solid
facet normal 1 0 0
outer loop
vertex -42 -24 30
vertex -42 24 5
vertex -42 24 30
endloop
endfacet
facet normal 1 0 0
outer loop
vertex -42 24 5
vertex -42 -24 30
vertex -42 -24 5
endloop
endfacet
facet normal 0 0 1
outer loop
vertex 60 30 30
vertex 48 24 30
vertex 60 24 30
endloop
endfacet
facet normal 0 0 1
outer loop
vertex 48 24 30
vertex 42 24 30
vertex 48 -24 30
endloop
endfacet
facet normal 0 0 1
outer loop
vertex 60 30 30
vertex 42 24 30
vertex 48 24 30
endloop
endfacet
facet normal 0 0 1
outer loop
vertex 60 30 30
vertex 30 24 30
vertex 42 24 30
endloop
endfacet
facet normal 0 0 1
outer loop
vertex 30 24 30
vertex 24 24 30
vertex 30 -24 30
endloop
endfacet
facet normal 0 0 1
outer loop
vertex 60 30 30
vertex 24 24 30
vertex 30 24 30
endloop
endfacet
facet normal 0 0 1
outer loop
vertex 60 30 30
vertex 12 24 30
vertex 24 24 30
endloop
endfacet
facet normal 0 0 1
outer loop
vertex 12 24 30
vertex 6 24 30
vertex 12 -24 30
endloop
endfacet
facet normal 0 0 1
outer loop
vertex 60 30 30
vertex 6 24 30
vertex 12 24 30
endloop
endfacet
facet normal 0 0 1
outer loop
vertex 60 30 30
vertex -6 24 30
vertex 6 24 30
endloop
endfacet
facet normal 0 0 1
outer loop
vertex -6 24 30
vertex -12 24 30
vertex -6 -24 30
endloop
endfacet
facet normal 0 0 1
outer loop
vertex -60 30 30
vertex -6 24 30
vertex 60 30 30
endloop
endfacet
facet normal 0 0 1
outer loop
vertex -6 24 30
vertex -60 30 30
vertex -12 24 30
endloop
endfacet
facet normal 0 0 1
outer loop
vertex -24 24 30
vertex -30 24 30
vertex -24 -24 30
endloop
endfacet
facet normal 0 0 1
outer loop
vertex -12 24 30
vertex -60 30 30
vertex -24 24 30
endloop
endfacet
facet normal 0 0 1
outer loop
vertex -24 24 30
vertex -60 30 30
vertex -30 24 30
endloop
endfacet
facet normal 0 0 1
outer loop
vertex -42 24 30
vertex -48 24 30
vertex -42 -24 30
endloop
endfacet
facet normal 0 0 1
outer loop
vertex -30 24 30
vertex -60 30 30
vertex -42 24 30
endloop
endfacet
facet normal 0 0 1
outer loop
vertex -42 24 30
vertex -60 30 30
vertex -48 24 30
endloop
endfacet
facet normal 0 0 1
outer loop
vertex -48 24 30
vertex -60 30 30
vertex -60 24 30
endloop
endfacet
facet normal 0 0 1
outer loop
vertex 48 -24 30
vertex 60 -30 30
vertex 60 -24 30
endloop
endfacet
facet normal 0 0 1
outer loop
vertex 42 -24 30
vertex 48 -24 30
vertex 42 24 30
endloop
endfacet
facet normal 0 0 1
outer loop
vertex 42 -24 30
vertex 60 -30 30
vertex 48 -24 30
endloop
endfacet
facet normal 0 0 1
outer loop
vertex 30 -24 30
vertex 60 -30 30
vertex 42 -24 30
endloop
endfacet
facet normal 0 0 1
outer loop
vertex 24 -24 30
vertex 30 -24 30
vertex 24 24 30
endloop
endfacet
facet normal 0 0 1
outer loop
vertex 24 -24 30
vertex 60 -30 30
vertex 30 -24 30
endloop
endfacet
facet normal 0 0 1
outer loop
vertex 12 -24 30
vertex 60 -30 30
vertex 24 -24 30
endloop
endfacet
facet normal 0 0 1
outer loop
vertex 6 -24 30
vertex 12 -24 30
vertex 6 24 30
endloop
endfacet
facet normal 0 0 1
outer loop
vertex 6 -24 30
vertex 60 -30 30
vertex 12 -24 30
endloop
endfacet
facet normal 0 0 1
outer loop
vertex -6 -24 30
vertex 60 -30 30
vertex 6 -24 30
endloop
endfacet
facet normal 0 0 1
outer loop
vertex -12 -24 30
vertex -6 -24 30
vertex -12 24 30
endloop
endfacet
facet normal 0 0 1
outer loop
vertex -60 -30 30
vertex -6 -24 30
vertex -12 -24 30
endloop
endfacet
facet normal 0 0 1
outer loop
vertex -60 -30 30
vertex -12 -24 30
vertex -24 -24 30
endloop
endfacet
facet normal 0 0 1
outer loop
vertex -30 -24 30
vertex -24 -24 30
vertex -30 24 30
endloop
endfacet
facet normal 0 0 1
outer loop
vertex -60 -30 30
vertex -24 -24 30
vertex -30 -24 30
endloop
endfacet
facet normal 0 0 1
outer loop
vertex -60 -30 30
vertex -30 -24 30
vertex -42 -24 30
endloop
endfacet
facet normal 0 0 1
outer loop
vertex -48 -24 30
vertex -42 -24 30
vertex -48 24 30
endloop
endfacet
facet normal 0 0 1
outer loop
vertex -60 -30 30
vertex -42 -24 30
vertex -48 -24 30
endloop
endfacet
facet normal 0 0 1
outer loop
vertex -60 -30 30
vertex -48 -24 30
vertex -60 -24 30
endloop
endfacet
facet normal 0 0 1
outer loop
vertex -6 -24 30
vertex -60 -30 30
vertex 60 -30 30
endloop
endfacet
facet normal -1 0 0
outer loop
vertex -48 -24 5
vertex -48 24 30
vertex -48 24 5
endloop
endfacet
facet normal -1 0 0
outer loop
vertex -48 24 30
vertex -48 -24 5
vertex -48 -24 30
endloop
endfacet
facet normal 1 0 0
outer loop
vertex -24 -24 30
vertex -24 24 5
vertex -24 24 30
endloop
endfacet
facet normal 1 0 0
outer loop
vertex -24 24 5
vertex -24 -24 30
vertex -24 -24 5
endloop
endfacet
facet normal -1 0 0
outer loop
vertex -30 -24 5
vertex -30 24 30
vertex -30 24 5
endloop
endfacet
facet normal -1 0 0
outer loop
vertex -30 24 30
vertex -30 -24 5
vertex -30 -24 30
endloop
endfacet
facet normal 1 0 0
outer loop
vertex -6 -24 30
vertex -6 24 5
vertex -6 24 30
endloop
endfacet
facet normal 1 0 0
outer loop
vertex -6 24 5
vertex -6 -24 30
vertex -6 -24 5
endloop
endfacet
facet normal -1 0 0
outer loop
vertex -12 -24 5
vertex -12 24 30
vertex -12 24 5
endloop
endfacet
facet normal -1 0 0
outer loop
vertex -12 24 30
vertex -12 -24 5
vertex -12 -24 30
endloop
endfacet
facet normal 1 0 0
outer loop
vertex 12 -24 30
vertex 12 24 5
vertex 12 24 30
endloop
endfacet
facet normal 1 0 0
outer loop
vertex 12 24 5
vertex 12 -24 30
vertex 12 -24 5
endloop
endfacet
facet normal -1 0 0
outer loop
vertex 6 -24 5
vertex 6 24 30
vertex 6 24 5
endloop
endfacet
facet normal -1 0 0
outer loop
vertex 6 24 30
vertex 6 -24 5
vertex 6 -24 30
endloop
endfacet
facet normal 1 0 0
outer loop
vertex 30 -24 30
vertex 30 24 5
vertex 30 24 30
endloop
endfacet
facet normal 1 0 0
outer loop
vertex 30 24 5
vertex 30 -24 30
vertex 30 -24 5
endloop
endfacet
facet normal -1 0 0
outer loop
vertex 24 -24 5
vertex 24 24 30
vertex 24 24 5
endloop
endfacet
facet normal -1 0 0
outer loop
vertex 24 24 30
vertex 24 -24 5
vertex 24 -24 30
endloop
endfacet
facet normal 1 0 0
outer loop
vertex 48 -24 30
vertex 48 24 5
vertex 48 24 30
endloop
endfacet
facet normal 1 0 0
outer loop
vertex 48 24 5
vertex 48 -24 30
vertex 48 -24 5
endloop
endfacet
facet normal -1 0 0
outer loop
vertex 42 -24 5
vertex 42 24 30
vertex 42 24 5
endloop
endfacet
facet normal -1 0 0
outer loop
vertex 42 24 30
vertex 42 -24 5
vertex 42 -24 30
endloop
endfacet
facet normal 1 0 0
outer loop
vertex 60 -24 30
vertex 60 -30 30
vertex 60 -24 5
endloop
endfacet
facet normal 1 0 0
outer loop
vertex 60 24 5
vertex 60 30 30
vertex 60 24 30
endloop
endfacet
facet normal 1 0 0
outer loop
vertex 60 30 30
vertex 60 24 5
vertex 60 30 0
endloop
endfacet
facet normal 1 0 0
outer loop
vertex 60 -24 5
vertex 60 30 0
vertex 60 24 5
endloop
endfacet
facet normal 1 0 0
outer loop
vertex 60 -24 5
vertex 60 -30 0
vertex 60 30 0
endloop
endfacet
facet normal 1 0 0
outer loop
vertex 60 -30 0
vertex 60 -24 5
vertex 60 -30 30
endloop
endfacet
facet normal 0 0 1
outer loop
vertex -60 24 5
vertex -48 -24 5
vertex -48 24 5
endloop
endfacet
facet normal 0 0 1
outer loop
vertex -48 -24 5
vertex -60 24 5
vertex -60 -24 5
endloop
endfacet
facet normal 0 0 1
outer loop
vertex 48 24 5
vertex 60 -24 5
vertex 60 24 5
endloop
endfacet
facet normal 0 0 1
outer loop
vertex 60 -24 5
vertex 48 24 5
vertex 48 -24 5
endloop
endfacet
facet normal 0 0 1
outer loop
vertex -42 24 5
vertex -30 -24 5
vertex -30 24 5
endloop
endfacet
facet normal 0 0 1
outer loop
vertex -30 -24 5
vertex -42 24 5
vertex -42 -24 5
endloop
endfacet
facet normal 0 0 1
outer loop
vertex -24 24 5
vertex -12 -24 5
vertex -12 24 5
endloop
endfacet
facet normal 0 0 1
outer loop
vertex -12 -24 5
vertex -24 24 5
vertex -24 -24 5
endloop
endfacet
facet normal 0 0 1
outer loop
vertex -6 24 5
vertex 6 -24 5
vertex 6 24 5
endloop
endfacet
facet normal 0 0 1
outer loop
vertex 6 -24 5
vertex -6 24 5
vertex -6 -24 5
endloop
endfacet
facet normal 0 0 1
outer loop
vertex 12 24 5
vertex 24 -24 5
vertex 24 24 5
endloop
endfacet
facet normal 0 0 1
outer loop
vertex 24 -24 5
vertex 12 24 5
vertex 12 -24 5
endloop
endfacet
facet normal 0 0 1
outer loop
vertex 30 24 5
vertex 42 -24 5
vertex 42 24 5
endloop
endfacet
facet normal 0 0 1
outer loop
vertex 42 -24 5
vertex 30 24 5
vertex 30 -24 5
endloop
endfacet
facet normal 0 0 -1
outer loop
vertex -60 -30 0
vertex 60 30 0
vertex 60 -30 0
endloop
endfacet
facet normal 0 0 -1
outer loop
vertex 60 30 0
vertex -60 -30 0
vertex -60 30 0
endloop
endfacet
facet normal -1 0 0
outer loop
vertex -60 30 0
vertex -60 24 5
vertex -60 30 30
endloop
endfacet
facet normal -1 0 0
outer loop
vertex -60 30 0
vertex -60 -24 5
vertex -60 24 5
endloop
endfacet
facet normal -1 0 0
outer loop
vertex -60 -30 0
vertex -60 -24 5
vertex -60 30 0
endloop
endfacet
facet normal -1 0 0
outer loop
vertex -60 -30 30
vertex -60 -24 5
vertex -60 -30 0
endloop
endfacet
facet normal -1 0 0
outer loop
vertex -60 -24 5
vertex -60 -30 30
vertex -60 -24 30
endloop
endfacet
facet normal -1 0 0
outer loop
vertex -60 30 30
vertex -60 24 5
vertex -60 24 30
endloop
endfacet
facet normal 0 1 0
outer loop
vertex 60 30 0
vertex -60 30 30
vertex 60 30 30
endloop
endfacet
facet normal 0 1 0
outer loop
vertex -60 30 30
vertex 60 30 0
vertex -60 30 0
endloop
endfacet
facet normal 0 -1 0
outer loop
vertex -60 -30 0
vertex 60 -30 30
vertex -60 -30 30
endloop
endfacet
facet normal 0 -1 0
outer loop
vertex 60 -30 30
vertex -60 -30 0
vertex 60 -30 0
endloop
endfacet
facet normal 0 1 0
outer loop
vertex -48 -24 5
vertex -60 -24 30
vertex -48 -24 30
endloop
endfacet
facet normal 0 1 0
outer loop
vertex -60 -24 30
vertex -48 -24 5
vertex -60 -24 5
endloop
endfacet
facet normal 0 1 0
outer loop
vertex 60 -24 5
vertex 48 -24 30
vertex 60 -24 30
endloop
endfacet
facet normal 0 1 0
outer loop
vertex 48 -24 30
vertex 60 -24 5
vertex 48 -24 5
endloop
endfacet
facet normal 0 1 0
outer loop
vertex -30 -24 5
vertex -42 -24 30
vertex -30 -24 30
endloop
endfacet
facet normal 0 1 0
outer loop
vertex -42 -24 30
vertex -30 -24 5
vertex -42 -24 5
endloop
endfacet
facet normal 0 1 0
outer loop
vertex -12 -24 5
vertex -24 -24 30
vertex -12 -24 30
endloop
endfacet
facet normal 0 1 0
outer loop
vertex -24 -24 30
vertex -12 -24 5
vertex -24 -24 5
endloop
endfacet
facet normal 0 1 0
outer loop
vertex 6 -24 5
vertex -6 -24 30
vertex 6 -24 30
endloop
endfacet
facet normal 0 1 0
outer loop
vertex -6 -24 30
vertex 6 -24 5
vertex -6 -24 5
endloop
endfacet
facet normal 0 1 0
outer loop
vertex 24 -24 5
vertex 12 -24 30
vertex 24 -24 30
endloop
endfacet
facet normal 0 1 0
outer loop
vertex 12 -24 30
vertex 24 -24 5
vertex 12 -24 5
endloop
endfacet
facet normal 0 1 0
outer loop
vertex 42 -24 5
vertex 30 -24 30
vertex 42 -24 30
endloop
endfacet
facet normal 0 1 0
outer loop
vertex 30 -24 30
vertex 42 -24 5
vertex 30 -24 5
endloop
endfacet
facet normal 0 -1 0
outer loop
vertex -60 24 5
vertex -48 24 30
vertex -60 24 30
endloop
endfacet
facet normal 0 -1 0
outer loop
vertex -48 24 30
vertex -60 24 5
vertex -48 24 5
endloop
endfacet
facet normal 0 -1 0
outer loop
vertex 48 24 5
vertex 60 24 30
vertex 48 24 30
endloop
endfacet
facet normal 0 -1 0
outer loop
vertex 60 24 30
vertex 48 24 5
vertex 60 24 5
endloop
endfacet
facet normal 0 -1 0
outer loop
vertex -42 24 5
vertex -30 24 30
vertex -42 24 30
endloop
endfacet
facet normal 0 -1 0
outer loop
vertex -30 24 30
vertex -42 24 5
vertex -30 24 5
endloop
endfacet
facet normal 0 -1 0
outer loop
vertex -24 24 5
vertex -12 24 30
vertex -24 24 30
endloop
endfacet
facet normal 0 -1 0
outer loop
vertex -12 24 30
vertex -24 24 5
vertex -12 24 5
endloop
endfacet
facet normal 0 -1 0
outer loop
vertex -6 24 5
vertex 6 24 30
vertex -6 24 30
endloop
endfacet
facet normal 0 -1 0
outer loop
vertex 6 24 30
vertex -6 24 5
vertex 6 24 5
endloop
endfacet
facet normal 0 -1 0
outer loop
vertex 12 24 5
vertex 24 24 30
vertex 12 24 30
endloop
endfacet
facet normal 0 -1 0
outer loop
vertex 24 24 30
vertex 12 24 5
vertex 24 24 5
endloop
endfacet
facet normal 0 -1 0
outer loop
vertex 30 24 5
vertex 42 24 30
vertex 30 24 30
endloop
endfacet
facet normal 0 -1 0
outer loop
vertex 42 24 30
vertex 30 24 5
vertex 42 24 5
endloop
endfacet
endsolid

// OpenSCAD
$fn = 32;

// ----------------------------------------------------------------------
// Rib frame 120 x 60 x 30
// 6 ribs at 18 mm pitch
// ----------------------------------------------------------------------

// --- parameters (mm) ---
frame = [120, 60, 5];  // base plate size (x, y, z)
rail_w = 6;            // side rail width
ribs = 6;              // number of ribs
rib_t = 6;             // rib thickness
rib_h = 25;            // rib height above the base plate
pitch = 18;            // pitch between rib centres

// --- derived feature positions (mm) ---
span = (ribs - 1) * pitch;          // = 90   distance between the outer ribs
origin_x = -span / 2;               // = -45   X of the first rib
rib_len = frame[1] - 2 * rail_w + 2;  // = 50   rib length, 1 mm into each rail
feature_centers = [
  [origin_x + 0 * pitch, 0],
  [origin_x + 1 * pitch, 0],
  [origin_x + 2 * pitch, 0],
  [origin_x + 3 * pitch, 0],
  [origin_x + 4 * pitch, 0],
  [origin_x + 5 * pitch, 0]
];   // rib centre line, drives the rib loop

// base plate, two side rails, then the ribs read straight off feature_centers
union() {
  translate([-frame[0] / 2, -frame[1] / 2, 0]) cube(frame);
  translate([-frame[0] / 2, -frame[1] / 2, 0]) cube([frame[0], rail_w, frame[2] + rib_h]);
  translate([-frame[0] / 2, frame[1] / 2 - rail_w, 0]) cube([frame[0], rail_w, frame[2] + rib_h]);
  for (centre = feature_centers)
    translate([centre[0] - rib_t / 2, centre[1] - rib_len / 2, frame[2] - 1])
      cube([rib_t, rib_len, rib_h + 1]);
}
